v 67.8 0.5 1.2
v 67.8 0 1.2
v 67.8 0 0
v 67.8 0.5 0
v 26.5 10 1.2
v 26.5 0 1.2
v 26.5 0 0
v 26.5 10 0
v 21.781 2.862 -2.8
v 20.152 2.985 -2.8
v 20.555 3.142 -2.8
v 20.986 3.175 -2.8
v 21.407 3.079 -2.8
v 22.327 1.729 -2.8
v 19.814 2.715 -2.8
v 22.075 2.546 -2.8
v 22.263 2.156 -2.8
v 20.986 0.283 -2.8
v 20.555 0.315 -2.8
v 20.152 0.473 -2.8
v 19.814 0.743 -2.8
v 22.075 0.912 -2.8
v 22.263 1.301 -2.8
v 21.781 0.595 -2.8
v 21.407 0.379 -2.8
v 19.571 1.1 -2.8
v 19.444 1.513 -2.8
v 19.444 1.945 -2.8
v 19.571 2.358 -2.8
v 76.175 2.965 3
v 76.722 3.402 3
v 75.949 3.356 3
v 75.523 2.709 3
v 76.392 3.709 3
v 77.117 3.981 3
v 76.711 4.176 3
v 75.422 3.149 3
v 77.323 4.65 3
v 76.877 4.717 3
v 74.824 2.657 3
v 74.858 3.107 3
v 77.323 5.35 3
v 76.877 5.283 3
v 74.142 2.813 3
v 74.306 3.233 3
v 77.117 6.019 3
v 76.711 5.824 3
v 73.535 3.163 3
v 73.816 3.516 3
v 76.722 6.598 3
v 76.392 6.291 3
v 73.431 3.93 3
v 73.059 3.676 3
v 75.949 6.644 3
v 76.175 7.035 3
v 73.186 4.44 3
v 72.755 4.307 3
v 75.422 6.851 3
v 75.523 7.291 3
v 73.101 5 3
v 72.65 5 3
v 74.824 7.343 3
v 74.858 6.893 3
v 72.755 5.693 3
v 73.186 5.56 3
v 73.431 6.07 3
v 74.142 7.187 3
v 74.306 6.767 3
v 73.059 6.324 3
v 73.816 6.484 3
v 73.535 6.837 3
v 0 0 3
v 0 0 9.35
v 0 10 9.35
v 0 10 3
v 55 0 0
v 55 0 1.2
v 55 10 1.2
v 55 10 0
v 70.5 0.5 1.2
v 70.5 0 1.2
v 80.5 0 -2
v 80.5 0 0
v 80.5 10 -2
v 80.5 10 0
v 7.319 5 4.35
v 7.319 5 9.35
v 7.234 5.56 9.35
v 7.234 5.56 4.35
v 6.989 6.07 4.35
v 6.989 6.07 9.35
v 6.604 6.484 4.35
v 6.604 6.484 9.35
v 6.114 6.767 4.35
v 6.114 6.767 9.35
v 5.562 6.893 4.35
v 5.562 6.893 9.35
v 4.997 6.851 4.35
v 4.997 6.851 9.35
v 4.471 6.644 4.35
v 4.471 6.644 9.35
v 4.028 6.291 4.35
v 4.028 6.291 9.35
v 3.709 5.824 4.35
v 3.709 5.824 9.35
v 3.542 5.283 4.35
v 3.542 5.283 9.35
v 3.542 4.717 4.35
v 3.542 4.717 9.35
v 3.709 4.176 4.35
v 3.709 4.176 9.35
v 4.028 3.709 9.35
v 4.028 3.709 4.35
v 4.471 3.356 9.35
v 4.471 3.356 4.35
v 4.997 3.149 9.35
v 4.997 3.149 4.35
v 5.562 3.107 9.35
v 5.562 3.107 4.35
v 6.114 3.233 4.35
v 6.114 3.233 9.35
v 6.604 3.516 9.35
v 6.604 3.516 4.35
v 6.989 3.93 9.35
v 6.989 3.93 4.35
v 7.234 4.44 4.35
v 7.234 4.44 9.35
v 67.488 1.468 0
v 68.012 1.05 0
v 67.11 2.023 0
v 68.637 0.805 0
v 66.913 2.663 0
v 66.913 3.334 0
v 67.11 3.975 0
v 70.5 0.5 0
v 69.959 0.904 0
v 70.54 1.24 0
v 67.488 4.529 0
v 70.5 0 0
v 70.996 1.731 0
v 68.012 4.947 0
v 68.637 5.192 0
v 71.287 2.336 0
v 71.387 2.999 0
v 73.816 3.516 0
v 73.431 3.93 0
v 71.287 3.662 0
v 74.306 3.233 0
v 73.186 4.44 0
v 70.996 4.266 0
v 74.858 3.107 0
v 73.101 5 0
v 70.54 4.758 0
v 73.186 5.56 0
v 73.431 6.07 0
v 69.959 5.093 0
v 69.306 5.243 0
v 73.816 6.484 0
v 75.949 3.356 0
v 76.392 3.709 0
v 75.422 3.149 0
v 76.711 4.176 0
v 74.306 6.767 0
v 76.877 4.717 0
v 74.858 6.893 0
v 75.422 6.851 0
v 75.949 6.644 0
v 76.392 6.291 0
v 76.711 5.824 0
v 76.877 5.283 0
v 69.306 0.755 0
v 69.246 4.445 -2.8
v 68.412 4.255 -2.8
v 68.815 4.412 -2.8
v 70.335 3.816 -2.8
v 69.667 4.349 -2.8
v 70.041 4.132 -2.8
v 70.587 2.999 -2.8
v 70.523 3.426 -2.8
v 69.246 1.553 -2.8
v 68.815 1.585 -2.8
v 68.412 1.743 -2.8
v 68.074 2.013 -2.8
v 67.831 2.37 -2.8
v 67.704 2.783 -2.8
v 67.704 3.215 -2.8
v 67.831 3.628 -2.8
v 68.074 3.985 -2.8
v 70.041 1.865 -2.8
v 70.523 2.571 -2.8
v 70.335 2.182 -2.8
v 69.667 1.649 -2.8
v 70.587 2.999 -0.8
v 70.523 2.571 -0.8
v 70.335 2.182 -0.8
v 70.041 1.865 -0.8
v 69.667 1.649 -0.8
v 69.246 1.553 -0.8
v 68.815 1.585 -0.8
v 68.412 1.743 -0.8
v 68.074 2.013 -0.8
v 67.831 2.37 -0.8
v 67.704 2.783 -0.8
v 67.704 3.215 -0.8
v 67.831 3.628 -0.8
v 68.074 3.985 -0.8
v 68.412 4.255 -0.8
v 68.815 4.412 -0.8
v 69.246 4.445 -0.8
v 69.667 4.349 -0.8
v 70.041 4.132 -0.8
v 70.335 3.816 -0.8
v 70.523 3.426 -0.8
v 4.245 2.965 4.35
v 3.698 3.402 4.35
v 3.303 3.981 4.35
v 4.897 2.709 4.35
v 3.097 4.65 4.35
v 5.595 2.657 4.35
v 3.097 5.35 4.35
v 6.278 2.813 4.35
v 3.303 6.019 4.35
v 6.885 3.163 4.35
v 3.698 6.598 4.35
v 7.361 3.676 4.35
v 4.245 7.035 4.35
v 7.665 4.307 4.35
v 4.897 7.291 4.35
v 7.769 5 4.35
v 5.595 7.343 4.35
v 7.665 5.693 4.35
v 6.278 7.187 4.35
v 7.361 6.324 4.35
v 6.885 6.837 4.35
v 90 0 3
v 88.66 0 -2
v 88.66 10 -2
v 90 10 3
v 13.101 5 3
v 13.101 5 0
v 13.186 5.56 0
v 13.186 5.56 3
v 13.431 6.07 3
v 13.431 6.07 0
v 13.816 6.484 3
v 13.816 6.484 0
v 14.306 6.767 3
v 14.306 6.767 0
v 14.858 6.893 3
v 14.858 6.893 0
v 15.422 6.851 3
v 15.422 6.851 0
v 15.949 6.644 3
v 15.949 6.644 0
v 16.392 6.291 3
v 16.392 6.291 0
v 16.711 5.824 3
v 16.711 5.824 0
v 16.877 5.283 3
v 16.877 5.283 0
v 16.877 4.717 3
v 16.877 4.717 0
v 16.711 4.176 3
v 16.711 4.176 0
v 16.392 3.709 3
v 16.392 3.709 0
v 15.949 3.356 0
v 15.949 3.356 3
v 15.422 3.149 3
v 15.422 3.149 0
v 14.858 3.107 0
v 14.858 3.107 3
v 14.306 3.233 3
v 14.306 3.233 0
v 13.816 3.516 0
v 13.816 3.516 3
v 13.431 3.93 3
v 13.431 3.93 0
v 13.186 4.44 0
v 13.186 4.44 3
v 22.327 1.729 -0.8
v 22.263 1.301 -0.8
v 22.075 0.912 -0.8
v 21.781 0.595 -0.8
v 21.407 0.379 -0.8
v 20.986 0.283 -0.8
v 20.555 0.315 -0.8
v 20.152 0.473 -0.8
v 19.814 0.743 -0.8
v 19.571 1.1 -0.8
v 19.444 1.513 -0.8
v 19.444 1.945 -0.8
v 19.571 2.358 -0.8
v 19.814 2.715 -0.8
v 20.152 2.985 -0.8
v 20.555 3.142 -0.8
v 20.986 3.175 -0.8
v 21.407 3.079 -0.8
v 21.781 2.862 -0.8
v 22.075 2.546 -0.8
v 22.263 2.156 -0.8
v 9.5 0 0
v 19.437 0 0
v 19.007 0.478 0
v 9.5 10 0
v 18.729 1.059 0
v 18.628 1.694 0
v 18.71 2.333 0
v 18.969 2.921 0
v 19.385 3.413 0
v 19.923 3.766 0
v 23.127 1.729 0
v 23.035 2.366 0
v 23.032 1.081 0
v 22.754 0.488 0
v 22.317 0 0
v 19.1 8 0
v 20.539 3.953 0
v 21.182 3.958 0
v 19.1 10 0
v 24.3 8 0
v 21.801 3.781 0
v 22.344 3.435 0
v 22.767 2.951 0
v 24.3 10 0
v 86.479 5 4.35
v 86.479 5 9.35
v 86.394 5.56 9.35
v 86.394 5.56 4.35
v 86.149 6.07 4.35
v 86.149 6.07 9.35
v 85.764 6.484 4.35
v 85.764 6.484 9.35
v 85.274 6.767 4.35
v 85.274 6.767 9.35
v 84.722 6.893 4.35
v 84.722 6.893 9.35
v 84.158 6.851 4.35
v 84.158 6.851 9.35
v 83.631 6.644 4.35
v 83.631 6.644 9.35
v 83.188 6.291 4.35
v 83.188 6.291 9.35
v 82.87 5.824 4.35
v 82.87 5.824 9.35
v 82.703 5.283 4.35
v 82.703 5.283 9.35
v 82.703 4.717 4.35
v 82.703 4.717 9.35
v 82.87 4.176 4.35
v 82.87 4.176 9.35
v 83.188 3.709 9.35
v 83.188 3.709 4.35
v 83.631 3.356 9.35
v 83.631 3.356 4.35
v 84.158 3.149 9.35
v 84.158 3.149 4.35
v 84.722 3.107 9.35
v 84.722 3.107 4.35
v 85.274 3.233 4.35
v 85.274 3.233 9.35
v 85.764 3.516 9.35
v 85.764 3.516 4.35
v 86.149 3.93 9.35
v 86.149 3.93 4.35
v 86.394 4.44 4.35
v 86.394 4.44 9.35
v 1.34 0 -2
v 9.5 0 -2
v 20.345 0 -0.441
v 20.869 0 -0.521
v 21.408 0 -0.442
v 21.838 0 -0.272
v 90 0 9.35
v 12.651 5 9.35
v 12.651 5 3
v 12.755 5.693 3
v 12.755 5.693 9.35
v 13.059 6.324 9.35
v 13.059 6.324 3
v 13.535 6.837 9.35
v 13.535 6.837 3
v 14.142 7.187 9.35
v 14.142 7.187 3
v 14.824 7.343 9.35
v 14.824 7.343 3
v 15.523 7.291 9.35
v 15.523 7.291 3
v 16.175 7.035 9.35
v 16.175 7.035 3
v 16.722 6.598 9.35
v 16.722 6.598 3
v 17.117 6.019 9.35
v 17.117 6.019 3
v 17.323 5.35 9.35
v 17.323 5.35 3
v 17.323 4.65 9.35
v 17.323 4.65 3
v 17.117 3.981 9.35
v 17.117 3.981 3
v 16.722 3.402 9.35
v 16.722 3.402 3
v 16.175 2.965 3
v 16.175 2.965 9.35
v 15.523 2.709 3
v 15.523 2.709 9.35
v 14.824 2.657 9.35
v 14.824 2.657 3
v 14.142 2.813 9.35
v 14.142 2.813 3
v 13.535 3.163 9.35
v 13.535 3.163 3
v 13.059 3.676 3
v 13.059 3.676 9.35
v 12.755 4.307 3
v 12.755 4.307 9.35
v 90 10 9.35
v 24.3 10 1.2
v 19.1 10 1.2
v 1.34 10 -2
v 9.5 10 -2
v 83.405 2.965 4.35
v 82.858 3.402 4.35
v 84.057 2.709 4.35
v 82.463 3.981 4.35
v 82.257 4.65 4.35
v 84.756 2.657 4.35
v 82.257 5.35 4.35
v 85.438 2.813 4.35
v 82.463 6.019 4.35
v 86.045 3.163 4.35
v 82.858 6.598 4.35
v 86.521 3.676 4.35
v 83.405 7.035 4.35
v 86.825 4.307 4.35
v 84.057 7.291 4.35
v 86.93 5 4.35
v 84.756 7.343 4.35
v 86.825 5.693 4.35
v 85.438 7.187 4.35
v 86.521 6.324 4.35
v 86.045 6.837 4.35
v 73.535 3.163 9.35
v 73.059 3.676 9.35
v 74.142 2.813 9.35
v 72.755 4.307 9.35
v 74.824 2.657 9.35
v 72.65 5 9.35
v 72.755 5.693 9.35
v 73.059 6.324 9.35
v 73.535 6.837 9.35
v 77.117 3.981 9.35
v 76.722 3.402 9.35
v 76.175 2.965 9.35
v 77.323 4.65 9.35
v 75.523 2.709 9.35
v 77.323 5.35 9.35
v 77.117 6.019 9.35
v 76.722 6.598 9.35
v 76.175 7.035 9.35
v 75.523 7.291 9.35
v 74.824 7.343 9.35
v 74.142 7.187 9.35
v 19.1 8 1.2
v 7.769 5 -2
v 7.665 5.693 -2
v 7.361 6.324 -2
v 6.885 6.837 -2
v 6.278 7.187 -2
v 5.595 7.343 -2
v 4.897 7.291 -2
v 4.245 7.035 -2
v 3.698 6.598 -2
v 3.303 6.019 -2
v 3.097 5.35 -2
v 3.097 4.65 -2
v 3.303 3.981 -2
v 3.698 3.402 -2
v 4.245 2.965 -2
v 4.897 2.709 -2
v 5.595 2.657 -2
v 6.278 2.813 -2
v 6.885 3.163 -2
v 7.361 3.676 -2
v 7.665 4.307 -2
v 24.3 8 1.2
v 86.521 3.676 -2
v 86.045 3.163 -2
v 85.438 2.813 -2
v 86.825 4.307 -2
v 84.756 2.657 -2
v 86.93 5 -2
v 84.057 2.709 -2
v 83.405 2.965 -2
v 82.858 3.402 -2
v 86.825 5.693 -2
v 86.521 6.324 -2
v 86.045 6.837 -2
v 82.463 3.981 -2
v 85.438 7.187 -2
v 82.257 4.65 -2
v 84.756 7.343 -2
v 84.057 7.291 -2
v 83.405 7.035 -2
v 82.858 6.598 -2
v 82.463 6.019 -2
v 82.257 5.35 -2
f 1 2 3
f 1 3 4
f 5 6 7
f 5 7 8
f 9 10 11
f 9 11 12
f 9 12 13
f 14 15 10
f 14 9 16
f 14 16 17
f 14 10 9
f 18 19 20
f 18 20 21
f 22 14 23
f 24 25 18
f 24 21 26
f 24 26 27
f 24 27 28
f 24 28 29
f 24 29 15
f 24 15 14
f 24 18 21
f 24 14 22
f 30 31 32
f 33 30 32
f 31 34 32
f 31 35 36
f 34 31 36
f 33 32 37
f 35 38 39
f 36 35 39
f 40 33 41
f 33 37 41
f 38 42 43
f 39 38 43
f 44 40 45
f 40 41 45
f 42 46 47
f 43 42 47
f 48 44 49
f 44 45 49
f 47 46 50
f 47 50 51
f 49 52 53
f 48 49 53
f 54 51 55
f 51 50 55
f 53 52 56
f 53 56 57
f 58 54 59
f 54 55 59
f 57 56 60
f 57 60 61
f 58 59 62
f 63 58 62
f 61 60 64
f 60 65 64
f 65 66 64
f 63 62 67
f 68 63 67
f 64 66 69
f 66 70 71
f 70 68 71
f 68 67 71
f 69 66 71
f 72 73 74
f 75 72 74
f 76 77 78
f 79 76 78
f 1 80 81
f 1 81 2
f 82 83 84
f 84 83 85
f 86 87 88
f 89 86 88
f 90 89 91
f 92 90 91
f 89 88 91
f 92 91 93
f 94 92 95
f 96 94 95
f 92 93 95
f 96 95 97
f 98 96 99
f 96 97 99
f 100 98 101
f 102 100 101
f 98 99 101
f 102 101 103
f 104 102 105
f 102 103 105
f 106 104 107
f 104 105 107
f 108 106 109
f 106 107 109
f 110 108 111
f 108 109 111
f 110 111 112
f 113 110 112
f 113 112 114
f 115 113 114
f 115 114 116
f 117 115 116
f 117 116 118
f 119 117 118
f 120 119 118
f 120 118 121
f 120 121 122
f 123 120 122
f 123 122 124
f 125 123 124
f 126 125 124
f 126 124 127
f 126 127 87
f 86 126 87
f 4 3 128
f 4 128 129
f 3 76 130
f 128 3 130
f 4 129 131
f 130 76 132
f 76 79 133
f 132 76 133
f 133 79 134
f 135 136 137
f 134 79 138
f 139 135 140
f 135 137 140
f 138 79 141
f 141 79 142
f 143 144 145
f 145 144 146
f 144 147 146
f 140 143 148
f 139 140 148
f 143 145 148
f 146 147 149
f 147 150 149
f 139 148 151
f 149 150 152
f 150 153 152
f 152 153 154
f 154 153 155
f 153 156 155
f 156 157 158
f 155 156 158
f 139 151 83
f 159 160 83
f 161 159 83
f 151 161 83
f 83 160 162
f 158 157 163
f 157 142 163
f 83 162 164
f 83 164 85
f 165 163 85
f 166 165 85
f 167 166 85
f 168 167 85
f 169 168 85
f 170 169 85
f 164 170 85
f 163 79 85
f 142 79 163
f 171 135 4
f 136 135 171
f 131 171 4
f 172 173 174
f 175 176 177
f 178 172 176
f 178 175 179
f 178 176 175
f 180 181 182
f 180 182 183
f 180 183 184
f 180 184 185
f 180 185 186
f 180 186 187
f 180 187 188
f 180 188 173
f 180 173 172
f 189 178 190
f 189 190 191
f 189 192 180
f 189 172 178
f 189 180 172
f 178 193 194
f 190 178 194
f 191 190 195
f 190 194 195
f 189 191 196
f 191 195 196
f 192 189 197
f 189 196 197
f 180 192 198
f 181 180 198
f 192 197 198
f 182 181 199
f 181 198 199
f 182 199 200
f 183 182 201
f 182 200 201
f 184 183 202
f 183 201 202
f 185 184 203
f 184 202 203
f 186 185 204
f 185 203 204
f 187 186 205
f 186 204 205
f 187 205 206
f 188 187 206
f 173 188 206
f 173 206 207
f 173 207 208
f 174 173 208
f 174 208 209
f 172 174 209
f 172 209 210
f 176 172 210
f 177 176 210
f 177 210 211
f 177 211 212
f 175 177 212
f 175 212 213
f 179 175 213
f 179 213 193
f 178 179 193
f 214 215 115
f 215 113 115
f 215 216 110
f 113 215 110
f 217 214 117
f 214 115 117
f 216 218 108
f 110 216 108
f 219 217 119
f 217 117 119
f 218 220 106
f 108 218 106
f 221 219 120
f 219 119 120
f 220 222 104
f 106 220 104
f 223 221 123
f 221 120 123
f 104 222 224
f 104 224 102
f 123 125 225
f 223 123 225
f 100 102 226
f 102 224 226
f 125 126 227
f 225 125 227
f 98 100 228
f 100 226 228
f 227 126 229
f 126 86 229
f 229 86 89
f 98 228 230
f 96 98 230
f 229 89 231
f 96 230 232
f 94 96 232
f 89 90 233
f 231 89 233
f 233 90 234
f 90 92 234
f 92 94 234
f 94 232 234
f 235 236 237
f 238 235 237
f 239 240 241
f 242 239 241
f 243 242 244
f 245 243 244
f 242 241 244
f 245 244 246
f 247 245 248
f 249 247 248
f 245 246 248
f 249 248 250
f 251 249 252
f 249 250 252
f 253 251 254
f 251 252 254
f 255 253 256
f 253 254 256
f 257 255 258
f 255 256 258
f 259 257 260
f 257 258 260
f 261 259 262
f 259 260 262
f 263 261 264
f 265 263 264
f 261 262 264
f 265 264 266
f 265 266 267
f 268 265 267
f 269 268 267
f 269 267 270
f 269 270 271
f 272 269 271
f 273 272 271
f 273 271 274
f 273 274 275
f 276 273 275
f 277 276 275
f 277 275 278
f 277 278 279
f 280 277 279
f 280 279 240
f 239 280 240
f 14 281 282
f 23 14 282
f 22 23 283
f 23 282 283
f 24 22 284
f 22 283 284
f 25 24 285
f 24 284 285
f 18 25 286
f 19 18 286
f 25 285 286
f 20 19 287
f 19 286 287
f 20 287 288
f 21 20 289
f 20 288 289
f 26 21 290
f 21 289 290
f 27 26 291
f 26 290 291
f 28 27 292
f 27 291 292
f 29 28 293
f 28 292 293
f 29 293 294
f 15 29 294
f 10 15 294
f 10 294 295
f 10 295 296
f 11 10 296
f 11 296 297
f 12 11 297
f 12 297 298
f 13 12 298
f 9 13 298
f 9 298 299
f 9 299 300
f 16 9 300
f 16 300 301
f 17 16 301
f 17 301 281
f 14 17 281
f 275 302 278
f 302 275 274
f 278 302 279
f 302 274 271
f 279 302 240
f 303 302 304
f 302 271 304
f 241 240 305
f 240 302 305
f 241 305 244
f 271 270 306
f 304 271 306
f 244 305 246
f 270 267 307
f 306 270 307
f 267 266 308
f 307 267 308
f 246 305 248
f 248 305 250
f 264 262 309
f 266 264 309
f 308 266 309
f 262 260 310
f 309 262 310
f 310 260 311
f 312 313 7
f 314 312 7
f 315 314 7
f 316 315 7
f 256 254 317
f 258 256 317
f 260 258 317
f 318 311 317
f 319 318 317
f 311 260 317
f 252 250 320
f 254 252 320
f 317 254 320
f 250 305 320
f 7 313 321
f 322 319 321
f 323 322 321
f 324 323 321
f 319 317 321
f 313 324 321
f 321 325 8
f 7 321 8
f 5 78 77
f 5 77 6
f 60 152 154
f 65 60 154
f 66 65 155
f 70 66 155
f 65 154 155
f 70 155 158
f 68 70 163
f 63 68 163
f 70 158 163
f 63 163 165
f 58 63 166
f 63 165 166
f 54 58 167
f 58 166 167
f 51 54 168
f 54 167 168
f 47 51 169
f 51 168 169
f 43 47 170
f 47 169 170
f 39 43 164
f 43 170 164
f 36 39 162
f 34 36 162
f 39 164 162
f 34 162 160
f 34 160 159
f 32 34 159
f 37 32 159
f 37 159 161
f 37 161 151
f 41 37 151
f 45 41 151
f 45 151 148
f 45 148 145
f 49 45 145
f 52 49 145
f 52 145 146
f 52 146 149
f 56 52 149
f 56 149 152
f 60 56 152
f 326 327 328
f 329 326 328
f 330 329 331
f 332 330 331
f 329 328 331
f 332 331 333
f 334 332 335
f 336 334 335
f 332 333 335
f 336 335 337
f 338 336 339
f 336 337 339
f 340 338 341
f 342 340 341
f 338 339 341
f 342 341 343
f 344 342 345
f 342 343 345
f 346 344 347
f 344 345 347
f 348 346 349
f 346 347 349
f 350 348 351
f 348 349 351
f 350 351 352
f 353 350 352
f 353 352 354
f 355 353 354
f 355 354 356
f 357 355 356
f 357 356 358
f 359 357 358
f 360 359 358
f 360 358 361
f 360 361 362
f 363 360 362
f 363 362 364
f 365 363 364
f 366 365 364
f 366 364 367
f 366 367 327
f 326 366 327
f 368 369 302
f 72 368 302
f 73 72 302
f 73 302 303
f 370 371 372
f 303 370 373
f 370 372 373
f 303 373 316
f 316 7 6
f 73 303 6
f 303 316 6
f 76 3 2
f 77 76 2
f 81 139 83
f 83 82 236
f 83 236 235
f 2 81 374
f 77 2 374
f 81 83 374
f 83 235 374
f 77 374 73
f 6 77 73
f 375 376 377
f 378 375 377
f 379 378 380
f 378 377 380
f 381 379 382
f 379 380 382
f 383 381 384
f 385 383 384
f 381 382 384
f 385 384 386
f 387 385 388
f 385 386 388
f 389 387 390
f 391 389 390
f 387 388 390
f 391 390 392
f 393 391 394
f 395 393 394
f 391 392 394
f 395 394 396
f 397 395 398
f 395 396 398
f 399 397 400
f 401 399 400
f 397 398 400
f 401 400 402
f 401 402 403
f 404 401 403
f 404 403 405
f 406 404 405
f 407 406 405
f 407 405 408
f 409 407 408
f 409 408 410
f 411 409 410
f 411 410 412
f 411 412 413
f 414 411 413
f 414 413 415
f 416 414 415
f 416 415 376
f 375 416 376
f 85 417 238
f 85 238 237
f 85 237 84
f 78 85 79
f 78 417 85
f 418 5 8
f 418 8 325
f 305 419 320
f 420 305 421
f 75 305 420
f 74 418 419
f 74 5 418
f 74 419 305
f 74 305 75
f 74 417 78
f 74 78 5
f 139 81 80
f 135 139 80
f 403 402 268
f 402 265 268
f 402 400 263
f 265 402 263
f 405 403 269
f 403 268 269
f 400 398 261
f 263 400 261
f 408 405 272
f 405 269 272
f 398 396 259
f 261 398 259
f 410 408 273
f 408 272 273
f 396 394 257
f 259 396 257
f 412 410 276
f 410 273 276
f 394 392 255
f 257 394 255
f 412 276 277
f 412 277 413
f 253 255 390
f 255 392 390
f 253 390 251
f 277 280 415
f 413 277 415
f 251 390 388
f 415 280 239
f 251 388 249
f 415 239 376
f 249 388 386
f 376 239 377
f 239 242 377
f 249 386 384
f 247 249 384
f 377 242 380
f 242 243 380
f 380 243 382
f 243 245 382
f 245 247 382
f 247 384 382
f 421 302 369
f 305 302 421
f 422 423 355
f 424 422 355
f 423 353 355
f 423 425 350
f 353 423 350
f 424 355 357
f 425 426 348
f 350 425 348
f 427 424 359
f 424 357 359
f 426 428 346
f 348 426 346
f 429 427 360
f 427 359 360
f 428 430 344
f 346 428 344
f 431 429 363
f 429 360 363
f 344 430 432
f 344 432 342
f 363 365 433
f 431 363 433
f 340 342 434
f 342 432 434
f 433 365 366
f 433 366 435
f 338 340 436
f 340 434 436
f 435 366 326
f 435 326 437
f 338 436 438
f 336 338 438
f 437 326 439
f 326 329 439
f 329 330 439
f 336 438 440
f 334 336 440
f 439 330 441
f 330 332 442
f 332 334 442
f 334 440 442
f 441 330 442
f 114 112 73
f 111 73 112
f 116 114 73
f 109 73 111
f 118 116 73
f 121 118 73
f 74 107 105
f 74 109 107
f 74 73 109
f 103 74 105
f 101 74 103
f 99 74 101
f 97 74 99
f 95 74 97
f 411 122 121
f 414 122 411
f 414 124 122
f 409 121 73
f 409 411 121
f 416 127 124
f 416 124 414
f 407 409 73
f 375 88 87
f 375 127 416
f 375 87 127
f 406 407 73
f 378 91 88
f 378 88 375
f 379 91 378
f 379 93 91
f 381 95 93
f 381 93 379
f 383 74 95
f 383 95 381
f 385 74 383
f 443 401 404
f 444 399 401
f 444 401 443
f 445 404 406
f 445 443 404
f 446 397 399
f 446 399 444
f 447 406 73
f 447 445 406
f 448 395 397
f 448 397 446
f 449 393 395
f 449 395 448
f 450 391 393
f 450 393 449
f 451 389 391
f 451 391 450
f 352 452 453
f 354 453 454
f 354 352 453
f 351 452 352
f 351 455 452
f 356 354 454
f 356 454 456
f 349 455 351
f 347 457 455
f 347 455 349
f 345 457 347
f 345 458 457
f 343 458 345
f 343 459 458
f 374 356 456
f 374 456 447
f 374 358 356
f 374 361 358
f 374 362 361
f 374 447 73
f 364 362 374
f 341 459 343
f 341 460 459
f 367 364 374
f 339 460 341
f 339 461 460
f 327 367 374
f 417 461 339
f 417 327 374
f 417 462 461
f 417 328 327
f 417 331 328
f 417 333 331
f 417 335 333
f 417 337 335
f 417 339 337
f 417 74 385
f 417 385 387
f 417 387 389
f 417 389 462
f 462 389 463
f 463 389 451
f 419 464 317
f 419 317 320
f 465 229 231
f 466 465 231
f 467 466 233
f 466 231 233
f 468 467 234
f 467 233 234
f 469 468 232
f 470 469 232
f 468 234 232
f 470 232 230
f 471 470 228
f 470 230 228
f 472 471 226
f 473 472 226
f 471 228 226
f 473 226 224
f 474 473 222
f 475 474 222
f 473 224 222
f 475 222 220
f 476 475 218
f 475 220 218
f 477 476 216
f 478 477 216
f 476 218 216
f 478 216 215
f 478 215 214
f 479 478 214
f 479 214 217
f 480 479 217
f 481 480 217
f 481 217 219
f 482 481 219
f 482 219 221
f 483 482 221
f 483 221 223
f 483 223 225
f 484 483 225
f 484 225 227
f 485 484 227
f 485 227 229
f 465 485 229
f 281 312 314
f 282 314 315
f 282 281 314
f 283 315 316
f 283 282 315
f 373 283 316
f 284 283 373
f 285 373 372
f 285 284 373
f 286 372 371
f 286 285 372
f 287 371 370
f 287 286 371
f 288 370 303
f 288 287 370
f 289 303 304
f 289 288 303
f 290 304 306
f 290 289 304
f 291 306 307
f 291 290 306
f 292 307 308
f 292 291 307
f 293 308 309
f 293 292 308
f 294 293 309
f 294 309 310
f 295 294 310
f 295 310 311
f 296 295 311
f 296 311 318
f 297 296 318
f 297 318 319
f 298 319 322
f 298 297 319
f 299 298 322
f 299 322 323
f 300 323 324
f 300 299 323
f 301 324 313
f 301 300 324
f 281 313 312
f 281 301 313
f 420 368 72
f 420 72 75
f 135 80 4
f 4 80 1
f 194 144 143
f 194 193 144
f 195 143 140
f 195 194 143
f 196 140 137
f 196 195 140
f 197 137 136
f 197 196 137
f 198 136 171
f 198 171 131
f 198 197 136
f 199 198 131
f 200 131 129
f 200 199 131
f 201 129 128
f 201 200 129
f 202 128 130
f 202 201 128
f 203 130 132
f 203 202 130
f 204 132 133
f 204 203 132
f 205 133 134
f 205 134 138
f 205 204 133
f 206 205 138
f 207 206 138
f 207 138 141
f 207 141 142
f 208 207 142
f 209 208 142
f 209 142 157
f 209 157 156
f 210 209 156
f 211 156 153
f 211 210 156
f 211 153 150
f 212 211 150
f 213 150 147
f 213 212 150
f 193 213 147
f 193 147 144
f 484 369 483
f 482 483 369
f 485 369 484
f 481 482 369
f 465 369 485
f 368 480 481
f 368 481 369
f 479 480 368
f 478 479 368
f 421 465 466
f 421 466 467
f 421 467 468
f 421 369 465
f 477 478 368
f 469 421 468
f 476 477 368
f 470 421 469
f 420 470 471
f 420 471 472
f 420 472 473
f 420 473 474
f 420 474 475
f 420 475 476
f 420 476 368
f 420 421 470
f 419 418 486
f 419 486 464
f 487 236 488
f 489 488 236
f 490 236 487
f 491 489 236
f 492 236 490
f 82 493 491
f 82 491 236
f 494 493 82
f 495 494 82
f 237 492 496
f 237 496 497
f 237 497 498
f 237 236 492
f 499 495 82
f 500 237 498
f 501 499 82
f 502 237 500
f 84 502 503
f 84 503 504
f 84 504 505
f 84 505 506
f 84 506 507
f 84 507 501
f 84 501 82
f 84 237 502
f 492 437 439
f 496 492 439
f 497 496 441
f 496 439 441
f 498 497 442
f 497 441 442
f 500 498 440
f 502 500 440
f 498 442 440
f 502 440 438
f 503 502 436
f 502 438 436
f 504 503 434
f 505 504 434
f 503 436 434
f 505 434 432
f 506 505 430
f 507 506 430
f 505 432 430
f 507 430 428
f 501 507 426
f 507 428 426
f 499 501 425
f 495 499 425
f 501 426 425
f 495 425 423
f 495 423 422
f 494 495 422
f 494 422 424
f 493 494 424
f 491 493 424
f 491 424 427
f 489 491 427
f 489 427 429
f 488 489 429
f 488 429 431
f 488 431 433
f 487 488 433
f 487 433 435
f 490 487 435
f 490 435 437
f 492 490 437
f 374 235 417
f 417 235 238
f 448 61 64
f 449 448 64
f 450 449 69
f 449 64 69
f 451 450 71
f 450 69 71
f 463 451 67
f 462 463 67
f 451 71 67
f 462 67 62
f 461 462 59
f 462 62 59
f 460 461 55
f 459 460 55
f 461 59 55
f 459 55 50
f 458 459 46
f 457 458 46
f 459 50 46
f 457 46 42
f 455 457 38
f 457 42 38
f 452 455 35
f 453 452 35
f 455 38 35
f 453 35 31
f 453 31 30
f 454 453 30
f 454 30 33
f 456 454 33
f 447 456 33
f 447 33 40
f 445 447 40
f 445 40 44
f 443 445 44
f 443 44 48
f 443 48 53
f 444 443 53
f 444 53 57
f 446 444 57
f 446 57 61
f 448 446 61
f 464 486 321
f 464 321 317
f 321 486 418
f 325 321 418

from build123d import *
from OCP.BRepFilletAPI import BRepFilletAPI_MakeChamfer

# Parameters (mm, degrees)
SKETCH2_W                       = 90
SKETCH2_H                       = 10
BOSS_EXTRUDE1_DEPTH             = 9.35
SKETCH4_W                       = 9.5
SKETCH4_H                       = 10
BOSS_EXTRUDE2_DEPTH             = 2
SKETCH5_R                       = 1.45
BOSS_EXTRUDE3_DEPTH             = 2.8
CHAMFER1_SIZE                   = 0.8
CHAMFER2_SIZE                   = 5
CHAMFER2_SIZE2                  = 1.339745962
F_13_0_185_DIAMETER_HOLE1_D     = 4.699
F_13_0_185_DIAMETER_HOLE1_DEPTH = 6.35
F_6_CLEARANCE_HOLE1_D           = 3.7973
F_6_CLEARANCE_HOLE1_ON_FACE_2_D = 3.7973
F_13_0_185_DIAMETER_HOLE2_D     = 4.699
F_13_0_185_DIAMETER_HOLE2_DEPTH = 6.35
F_6_CLEARANCE_HOLE2_D           = 3.7973
CUT_EXTRUDE1_DEPTH              = 92.035281622
CUT_EXTRUDE1_DEPTH_BACK         = 1.2
SKETCH12_W                      = 28.5
SKETCH12_H                      = 10
SKETCH12_W_2                    = 5.2
SKETCH12_H_2                    = 2
SKETCH12_W_3                    = 2.7
SKETCH12_H_3                    = 0.5


with BuildPart() as part:
    # Sketch2 → Boss-Extrude1 (new body)
    with BuildSketch(Plane.XY):
        with Locations((45, 5)):
            Rectangle(SKETCH2_W, SKETCH2_H)
    extrude(amount=BOSS_EXTRUDE1_DEPTH)

    # Sketch4 → Boss-Extrude2 (add)
    with BuildSketch(Plane(origin=(0, 0, 0), x_dir=(-1, 0, 0), z_dir=(0, 0, -1))):
        with Locations((-4.75, 5)):
            Rectangle(SKETCH4_W, SKETCH4_H)
        with Locations((-85.25, 5)):
            Rectangle(SKETCH4_W, SKETCH4_H)
    extrude(amount=BOSS_EXTRUDE2_DEPTH)

    # Sketch5 → Boss-Extrude3 (add)
    with BuildSketch(Plane(origin=(0, 0, 0), x_dir=(-1, 0, 0), z_dir=(0, 0, -1))):
        with Locations(Location((-69.137406388, 2.998839673, 0), (0, 0, 180))):
            Circle(SKETCH5_R)
        with Locations(Location((-20.877406388, 1.728839673, 0), (0, 0, 180))):
            Circle(SKETCH5_R)
    extrude(amount=BOSS_EXTRUDE3_DEPTH)

    # Chamfer1
    # the kernel refuses this chamfer: 0.8 mm, written as the material it adds along each edge
    with BuildSketch(Plane(origin=(69.137406388, 2.998839673, 0), x_dir=(1, 0, 0), z_dir=(0, 1, 0))) as chamfer1_piece_1:
        Polygon((1.45 + CHAMFER1_SIZE, 0), (1.45, CHAMFER1_SIZE), (1.45, 0), align=None)
    revolve(axis=Axis((69.137406388, 2.998839673, 0), (0, 0, -1)))
    with BuildSketch(Plane(origin=(20.877406388, 1.728839673, 0), x_dir=(1, 0, 0), z_dir=(0, 1, 0))) as chamfer1_piece_2_section:
        Polygon((1.45 + CHAMFER1_SIZE, 0), (1.45, CHAMFER1_SIZE), (1.45, 0), align=None)
    chamfer1_piece_2 = revolve(axis=Axis((20.877406388, 1.728839673, 0), (0, 0, -1)), mode=Mode.PRIVATE)
    chamfer1_piece_2 = split(chamfer1_piece_2, bisect_by=Plane(origin=(19.038199604, 0, -0.389206784), z_dir=(0, 1, 0)), keep=Keep.TOP, mode=Mode.PRIVATE)
    add(chamfer1_piece_2)

    # Chamfer2: one chamfer whose edges measure the first distance from different faces: ONE call of the kernel's chamfer builder (chamfer() names one face for all edges)
    chamfer2_edges_1 = [part.edges().sort_by_distance(p)[0] for p in [
        (0, 5, -2),
    ]]
    chamfer2_side_1 = [part.faces().sort_by_distance(p)[0] for p in [
        (0, 5, 3.675),
    ]]
    chamfer2_edges_2 = [part.edges().sort_by_distance(p)[0] for p in [
        (90, 5, -2),
    ]]
    chamfer2_side_2 = [part.faces().sort_by_distance(p)[0] for p in [
        (90, 5, 3.675),
    ]]
    chamfer2 = BRepFilletAPI_MakeChamfer(part.part.solid().wrapped)
    for e in chamfer2_edges_1:
        chamfer2.Add(CHAMFER2_SIZE, CHAMFER2_SIZE2, e.wrapped, chamfer2_side_1[0].wrapped)  # the first distance lies on this face
    for e in chamfer2_edges_2:
        chamfer2.Add(CHAMFER2_SIZE, CHAMFER2_SIZE2, e.wrapped, chamfer2_side_2[0].wrapped)  # the first distance lies on this face
    add(Compound.cast(chamfer2.Shape()), mode=Mode.REPLACE)

    # #13 (0.185) Diameter Hole1
    with Locations(Plane(origin=(84.580127019, 5, -2), x_dir=(-1, 0, 0), z_dir=(0, 0, -1))):
        with Locations((0, 0), (79.160254038, 0)):
            Hole(F_13_0_185_DIAMETER_HOLE1_D / 2, depth=F_13_0_185_DIAMETER_HOLE1_DEPTH)

    # #6 Clearance Hole1 (through all)
    with Locations(Plane(origin=(84.580127019, 5, 4.35), x_dir=(-1, 0, 0), z_dir=(0, 0, -1))):
        with Locations((0, 0), (79.160254038, 0)):
            Hole(F_6_CLEARANCE_HOLE1_D / 2)

    # #6 Clearance Hole1 on face 2 (through all)
    with Locations(Plane(origin=(5.419872981, 5, 0), x_dir=(-1, 0, 0), z_dir=(0, 0, -1))):
        with Locations((0, 0)):
            Hole(F_6_CLEARANCE_HOLE1_ON_FACE_2_D / 2)

    # #13 (0.185) Diameter Hole2
    with Locations(Plane(origin=(75, 5, 9.35), x_dir=(1, 0, 0), z_dir=(0, 0, 1))):
        with Locations((0, 0), (-60, 0)):
            Hole(F_13_0_185_DIAMETER_HOLE2_D / 2, depth=F_13_0_185_DIAMETER_HOLE2_DEPTH)

    # #6 Clearance Hole2 (through all)
    with Locations(Plane(origin=(75, 5, 3), x_dir=(1, 0, 0), z_dir=(0, 0, 1))):
        with Locations((0, 0), (-60, 0)):
            Hole(F_6_CLEARANCE_HOLE2_D / 2)

    # Sketch12 → Cut-Extrude1 (cut, two sides: drawn at the far end of the back side and taken through both)
    with BuildSketch(Plane(origin=(0, 0, 0), x_dir=(-1, 0, 0), z_dir=(0, 0, -1)).offset(-CUT_EXTRUDE1_DEPTH_BACK)):
        with Locations((-40.75, 5)):
            Rectangle(SKETCH12_W, SKETCH12_H)
        with Locations((-21.7, 9)):
            Rectangle(SKETCH12_W_2, SKETCH12_H_2)
        with Locations((-69.15, 0.25)):
            Rectangle(SKETCH12_W_3, SKETCH12_H_3)
    extrude(amount=CUT_EXTRUDE1_DEPTH + CUT_EXTRUDE1_DEPTH_BACK, mode=Mode.SUBTRACT)


solid = part.part
